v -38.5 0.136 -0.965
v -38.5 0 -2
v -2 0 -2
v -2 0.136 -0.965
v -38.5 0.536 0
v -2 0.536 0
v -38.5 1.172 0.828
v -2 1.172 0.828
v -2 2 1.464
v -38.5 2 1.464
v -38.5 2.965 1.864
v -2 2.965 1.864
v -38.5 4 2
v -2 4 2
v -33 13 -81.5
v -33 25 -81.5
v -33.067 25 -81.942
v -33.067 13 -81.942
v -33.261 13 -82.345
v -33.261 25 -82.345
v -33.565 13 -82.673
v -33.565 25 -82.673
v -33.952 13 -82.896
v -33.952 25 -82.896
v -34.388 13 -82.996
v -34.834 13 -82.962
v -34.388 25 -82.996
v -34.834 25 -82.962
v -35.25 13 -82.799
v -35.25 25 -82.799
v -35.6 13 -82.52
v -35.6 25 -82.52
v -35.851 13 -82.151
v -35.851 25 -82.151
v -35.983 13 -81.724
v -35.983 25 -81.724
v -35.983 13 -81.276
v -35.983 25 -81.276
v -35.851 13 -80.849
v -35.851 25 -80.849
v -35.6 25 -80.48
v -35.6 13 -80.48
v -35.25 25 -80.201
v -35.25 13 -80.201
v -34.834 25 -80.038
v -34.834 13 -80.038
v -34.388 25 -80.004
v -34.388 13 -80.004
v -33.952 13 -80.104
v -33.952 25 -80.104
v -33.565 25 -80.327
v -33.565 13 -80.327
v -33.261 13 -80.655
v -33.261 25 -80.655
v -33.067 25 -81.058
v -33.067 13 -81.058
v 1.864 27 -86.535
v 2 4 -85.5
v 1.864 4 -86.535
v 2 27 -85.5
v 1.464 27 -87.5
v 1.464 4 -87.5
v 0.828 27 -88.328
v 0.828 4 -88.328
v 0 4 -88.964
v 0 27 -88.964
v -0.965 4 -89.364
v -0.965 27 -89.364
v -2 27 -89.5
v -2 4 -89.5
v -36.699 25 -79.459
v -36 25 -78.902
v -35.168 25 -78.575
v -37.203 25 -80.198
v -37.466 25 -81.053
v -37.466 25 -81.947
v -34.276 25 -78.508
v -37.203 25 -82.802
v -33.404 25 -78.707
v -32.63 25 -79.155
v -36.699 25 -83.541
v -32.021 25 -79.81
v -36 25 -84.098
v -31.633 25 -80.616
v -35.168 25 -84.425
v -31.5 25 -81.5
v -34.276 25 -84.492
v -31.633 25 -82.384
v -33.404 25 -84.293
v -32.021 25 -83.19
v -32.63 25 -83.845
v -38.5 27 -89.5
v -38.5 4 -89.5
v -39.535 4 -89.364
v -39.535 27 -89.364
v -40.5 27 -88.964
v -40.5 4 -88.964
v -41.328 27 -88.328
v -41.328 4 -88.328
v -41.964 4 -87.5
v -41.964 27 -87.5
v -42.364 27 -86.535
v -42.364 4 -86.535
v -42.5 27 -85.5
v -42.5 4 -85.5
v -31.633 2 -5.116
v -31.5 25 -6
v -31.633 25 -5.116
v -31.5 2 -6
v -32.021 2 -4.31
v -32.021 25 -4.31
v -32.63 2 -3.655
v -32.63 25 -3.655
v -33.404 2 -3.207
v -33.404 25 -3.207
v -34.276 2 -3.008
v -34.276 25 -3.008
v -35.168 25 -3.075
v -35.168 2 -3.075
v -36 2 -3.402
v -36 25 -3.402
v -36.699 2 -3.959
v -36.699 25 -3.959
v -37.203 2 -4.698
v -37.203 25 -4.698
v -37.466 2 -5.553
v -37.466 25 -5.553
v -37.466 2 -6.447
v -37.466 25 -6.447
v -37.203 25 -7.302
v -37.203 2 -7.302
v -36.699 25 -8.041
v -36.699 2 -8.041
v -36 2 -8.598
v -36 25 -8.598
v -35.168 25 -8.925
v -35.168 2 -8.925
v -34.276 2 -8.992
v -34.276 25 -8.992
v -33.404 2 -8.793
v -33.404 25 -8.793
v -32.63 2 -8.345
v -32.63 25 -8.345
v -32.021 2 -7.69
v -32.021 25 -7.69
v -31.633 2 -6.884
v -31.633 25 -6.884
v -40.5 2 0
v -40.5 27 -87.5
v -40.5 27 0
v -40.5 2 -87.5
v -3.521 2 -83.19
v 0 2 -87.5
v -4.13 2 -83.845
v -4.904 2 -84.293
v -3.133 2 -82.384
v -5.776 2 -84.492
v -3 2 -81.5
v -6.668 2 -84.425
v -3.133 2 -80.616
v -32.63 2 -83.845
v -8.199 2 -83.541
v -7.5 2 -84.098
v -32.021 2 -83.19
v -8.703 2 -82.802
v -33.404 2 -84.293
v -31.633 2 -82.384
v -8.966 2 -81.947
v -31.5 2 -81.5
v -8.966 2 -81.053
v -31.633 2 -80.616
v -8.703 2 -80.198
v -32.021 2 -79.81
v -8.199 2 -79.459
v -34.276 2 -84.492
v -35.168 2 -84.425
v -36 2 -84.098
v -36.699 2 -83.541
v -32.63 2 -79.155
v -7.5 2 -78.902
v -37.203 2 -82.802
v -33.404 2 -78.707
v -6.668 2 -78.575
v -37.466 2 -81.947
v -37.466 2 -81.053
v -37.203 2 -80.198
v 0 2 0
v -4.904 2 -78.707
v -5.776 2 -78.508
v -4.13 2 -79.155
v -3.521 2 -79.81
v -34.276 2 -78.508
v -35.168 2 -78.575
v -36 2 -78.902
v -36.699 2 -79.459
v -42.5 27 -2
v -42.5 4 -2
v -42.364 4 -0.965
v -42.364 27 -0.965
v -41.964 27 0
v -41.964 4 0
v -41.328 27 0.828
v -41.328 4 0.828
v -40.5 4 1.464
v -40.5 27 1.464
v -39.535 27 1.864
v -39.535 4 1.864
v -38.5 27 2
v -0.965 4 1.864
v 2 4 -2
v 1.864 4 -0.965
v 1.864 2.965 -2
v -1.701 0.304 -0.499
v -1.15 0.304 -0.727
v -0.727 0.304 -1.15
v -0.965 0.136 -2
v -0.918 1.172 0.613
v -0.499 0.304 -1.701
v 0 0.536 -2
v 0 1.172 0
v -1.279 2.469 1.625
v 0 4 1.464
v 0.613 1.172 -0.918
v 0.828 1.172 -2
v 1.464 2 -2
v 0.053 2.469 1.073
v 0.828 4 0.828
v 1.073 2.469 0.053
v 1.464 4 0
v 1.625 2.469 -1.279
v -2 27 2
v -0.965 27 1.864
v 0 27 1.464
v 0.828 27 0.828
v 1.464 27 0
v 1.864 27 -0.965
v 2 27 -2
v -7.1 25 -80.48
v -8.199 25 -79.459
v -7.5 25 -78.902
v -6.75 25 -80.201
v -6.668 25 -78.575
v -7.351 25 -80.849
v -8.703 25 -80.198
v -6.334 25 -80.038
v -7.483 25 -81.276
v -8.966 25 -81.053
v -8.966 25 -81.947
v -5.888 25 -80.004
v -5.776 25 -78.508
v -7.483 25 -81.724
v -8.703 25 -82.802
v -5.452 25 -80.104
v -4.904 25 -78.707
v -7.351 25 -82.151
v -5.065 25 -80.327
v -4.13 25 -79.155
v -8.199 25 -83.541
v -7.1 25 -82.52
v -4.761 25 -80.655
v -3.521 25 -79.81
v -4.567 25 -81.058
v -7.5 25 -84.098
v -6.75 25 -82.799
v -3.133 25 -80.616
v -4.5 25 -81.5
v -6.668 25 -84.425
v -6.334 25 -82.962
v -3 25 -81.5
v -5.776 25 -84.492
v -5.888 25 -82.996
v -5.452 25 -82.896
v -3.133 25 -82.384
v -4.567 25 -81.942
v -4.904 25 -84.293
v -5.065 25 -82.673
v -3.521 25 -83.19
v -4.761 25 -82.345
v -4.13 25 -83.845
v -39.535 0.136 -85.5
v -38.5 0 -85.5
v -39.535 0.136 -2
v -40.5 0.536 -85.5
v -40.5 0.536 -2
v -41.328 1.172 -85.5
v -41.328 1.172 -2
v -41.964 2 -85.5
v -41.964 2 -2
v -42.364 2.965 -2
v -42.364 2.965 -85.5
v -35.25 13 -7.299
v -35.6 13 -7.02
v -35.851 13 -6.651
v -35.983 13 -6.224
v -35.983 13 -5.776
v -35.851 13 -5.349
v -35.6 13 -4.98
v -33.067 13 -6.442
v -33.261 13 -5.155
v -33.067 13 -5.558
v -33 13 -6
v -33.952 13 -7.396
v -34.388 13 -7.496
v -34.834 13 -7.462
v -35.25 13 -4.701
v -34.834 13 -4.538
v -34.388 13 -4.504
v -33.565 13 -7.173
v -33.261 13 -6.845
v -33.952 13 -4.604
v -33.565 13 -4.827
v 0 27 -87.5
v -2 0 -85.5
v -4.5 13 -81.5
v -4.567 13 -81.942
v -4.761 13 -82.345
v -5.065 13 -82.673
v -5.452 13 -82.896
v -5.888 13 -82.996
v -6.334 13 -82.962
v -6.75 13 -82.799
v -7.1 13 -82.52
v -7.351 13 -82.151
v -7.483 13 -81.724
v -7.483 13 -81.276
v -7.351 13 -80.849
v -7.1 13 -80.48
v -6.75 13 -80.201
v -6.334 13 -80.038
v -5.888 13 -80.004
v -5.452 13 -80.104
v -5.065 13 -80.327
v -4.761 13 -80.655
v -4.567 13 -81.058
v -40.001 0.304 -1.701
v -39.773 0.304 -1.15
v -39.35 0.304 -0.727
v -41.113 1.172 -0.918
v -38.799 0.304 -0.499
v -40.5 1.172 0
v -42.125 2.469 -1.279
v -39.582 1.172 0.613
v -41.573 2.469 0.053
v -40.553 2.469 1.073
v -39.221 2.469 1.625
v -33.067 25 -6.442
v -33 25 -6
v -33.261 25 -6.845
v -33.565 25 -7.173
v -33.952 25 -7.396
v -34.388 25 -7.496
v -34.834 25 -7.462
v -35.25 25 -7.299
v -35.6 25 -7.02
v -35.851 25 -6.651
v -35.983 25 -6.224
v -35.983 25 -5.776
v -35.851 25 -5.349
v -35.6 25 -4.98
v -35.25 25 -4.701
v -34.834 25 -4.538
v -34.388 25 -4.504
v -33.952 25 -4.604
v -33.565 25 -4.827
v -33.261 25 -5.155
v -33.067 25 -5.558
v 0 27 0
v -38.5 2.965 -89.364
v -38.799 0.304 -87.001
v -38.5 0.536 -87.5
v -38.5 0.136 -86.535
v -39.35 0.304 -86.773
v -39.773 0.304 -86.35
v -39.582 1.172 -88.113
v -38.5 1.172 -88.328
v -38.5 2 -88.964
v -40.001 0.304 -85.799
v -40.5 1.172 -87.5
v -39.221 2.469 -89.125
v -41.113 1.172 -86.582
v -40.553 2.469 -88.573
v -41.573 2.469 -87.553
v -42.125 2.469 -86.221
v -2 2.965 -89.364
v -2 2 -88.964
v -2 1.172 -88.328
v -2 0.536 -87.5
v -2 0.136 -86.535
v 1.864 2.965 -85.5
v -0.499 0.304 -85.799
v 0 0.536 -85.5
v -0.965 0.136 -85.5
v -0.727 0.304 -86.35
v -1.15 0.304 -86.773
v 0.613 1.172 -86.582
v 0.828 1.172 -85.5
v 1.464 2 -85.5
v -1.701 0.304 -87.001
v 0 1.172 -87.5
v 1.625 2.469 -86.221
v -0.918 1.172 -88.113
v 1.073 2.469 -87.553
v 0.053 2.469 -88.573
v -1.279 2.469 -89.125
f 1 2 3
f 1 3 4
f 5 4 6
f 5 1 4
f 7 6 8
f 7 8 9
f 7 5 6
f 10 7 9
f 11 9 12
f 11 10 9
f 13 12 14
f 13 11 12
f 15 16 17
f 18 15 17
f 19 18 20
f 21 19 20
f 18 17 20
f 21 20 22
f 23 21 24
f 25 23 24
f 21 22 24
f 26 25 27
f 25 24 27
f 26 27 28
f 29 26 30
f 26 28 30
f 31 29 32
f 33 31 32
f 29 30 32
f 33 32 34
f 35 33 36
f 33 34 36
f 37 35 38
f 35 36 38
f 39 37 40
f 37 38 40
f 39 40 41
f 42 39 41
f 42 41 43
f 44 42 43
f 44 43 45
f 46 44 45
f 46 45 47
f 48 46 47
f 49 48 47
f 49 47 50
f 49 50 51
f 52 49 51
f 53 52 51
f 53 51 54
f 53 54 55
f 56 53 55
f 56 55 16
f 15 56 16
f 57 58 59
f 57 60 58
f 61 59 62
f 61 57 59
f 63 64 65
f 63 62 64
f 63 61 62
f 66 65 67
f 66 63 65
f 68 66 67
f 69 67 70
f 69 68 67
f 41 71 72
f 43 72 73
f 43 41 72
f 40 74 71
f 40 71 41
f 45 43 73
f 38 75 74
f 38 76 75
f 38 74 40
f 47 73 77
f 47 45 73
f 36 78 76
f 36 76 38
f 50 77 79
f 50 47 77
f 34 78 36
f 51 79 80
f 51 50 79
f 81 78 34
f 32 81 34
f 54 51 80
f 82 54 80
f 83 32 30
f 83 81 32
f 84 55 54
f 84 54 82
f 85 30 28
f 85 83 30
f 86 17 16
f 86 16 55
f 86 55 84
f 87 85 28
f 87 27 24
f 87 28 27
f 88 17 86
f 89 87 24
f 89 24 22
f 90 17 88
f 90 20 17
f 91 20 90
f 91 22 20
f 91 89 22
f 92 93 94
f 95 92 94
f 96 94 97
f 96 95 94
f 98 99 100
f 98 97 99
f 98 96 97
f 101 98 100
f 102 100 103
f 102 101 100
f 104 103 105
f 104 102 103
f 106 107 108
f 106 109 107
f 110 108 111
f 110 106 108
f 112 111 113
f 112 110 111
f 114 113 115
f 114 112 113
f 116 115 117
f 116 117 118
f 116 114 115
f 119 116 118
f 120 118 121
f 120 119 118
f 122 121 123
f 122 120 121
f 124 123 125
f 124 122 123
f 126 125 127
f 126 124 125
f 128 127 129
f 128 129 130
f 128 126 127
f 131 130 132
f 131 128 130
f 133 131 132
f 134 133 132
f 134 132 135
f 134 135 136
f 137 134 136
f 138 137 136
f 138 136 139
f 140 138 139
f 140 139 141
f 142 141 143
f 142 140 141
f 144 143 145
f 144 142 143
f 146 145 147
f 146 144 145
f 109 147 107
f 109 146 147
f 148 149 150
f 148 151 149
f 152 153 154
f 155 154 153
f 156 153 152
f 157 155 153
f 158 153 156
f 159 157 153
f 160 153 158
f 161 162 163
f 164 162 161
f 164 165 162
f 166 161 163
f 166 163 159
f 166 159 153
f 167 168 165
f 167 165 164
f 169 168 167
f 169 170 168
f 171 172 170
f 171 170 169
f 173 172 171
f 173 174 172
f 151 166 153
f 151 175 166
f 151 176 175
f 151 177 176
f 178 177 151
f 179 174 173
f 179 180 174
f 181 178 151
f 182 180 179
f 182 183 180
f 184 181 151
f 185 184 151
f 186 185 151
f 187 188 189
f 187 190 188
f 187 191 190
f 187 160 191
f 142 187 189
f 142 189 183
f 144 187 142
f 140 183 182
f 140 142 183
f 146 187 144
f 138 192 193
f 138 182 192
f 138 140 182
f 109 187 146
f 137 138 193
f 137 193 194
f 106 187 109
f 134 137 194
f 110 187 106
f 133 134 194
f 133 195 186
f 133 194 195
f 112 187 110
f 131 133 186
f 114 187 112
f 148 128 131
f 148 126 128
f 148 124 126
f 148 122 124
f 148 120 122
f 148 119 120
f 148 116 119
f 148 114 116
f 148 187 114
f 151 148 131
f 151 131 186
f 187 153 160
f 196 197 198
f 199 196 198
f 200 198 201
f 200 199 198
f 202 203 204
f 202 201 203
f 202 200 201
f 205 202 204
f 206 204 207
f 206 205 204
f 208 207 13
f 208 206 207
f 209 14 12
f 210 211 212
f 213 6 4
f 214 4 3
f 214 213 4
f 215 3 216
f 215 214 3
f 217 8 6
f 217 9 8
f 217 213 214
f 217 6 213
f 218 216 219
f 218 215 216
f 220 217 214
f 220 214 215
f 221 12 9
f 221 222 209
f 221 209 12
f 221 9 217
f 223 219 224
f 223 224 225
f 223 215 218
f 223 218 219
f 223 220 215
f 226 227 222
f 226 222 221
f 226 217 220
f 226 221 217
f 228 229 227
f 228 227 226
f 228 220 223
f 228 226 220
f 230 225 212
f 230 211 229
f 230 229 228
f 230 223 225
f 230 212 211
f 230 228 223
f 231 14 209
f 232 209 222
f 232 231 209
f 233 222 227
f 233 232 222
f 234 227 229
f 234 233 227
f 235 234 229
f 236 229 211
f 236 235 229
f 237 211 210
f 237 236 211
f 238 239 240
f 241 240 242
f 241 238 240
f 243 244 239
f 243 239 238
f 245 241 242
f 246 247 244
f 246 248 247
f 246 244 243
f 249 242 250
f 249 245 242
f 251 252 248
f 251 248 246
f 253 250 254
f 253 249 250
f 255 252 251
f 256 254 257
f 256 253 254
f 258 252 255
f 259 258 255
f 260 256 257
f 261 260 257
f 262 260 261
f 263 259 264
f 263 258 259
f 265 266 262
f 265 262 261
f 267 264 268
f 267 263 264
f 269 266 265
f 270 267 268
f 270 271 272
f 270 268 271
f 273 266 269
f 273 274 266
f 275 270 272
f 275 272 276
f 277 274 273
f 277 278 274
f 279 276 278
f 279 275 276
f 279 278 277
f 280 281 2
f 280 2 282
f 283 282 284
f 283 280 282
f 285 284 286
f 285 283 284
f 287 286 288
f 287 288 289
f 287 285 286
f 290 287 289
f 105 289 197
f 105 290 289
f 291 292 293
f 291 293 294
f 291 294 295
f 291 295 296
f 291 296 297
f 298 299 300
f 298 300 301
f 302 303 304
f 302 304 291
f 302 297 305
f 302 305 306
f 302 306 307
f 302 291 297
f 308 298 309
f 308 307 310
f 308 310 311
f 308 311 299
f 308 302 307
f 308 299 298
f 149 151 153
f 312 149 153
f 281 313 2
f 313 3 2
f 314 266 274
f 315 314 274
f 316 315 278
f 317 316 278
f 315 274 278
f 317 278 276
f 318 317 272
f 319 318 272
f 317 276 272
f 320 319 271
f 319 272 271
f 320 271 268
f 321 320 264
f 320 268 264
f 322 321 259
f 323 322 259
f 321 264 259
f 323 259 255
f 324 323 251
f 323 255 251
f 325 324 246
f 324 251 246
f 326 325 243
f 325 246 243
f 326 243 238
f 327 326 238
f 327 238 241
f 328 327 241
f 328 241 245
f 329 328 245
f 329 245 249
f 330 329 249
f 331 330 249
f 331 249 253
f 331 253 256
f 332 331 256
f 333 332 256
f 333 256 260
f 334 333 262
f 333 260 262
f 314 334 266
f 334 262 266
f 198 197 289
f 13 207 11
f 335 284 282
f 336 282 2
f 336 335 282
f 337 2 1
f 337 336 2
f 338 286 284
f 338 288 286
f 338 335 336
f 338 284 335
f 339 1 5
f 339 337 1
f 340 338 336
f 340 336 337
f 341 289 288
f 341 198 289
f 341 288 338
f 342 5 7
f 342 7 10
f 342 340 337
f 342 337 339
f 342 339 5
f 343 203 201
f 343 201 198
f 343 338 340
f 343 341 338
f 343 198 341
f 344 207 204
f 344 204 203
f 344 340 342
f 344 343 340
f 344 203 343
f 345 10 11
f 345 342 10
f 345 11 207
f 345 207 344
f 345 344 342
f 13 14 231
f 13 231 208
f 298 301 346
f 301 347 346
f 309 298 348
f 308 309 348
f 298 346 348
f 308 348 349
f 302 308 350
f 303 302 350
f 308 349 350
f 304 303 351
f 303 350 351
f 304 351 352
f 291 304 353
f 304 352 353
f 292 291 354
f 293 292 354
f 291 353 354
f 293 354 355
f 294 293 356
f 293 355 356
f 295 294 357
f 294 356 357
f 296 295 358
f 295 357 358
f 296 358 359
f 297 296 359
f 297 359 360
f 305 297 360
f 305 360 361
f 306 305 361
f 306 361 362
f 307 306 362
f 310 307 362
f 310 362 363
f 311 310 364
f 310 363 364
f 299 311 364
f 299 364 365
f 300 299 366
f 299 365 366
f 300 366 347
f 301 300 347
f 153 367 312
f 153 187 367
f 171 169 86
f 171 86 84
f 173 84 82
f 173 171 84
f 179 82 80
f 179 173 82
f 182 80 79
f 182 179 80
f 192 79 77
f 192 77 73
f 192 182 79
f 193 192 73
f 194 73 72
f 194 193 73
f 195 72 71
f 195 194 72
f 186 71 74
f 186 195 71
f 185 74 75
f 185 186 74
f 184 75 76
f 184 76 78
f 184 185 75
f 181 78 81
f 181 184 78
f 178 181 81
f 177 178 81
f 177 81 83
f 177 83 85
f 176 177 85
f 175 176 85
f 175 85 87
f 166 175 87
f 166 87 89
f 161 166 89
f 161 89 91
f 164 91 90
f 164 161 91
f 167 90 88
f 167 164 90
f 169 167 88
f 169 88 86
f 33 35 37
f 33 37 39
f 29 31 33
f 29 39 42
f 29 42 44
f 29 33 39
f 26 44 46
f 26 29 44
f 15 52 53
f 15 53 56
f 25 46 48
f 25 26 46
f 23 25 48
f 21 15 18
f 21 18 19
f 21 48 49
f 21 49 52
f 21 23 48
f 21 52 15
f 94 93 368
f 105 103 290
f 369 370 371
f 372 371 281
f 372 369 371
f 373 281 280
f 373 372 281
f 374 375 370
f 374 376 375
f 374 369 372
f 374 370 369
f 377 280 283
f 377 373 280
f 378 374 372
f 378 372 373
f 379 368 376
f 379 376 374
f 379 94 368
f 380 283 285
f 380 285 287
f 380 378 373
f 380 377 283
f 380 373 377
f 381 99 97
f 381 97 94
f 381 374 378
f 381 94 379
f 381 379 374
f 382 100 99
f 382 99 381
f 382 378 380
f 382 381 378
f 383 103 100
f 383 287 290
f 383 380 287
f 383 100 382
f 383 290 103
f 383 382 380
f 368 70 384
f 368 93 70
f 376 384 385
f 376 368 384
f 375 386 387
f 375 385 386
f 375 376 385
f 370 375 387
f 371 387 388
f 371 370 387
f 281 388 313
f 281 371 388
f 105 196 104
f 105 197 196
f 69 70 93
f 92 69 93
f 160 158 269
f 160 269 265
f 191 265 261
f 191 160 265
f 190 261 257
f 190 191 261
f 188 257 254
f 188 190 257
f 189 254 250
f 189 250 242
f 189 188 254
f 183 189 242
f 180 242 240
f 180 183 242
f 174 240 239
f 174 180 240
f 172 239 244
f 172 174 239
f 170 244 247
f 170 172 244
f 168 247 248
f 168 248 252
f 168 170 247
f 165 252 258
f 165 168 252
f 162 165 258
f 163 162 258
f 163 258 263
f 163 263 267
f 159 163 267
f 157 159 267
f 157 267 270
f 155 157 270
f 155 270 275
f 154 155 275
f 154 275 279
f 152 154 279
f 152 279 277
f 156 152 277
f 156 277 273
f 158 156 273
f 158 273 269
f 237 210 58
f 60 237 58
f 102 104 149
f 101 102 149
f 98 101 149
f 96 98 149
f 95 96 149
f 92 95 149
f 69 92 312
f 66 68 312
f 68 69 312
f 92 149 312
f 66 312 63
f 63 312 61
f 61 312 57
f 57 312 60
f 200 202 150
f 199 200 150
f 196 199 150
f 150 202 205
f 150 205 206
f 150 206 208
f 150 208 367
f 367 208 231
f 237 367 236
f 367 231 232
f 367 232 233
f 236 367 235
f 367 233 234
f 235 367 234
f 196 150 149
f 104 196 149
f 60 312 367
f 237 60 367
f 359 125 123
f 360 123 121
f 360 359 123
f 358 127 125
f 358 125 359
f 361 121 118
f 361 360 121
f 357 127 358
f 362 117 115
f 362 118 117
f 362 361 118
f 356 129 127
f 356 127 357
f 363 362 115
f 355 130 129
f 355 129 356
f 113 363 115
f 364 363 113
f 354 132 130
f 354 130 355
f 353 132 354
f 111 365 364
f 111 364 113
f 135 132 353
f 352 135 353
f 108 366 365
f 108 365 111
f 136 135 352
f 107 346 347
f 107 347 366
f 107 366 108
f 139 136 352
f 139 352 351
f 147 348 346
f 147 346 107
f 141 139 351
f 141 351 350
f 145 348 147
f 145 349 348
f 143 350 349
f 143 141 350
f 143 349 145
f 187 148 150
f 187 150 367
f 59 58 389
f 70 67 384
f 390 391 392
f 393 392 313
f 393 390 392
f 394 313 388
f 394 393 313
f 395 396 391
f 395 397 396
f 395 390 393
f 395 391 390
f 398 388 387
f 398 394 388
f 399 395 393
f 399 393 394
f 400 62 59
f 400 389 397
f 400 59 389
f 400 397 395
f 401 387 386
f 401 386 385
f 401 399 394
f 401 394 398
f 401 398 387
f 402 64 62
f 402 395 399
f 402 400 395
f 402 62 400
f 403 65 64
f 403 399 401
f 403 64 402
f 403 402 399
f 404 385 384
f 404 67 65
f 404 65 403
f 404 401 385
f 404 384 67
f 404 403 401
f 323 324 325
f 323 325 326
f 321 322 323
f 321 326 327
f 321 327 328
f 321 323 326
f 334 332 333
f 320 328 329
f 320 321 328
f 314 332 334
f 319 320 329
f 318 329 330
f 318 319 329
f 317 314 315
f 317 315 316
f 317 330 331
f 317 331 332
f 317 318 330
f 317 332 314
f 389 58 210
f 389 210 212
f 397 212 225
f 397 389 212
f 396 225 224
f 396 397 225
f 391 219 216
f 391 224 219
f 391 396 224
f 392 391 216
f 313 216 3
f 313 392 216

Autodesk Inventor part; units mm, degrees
ref_plane "YZ Plane" through (0, 0, 0) normal (1, 0, 0) x (0, 1, 0)
ref_plane "XZ Plane" through (0, 0, 0) normal (0, 1, 0) x (-1, 0, 0)
ref_plane "XY Plane" through (0, 0, 0) normal (0, 0, 1) x (1, 0, 0)
sketch "Sketch1" plane through (0, 0, 0) normal (0, 1, 0) x (-1, 0, 0)
  line L0 (0, 0) -> (40.5, 0)
  line L1 (40.5, 0) -> (40.5, -87.5)
  line L2 (40.5, -87.5) -> (0, -87.5)
  line L3 (0, -87.5) -> (0, 0)
  dimension "d0" = 40.5
  dimension "d1" = 87.5
extrude "Extrusion1" add sketch "Sketch1" along normal blind 2
sketch "Sketch3" plane through (0, 2, 0) normal (0, 1, 0) x (1, 0, 0)
  line L0 (-40.5, 0) -> (0, 0) projected
  line L1 (-40.5, 0) -> (-34.5, 0)
  line L2 (-34.5, 0) -> (-34.5, 6)
  line L3 (-34.5, 6) -> (-40.5, 6)
  line L4 (-40.5, 6) -> (-40.5, 0)
  circle A0 centre (-34.5, 6) radius 3
  line L5 (-40.5, 87.5) -> (-40.5, 0) projected
  line L6 (-40.5, 87.5) -> (-34.5, 87.5)
  line L7 (-34.5, 87.5) -> (-34.5, 81.5)
  line L8 (-34.5, 81.5) -> (-40.5, 81.5)
  line L9 (-40.5, 81.5) -> (-40.5, 87.5)
  circle A1 centre (-34.5, 81.5) radius 3
  line L10 (0, 0) -> (0, 87.5) projected
  line L11 (0, 87.5) -> (-6, 87.5)
  line L12 (-6, 87.5) -> (-6, 81.5)
  line L13 (-6, 81.5) -> (0, 81.5)
  line L14 (0, 81.5) -> (0, 87.5)
  circle A2 centre (-6, 81.5) radius 3
  dimension "d4" = 6
  dimension "d5" = 6
  dimension "d6" = 6
  dimension "d7" = 6
  dimension "d8" = 6
  dimension "d9" = 6
  dimension "d10" = 6
  dimension "d11" = 6
  dimension "d12" = 6
extrude "Extrusion2" add sketch "Sketch3" along normal blind 23 contours A0 L3 L2 | L2 L3 A0 | A1 L7 L8 | L8 L7 A1 | A2 L12 L13 | L13 L12 A2
sketch "Sketch4" plane through (-34.5, 25, -6) normal (0, 1, 0) x (1, 0, 0)
  circle A0 centre (0, 0) radius 1.5
  point P0 (34.5, -6)
  dimension "d15" = 3
sketch "Sketch5" plane through (-34.5, 25, -81.5) normal (0, 1, 0) x (1, 0, 0)
  circle A0 centre (0, 0) radius 1.5
  point P0 (34.5, -81.5)
  dimension "d16" = 3
sketch "Sketch6" plane through (-6, 25, -81.5) normal (0, 1, 0) x (1, 0, 0)
  circle A0 centre (0, 0) radius 1.5
  point P0 (6, -81.5)
  dimension "d17" = 3
extrude "Extrusion3" cut sketch "Sketch4" against normal blind 12
extrude "Extrusion4" cut sketch "Sketch5" against normal blind 12
extrude "Extrusion5" cut sketch "Sketch6" against normal blind 12
sketch "Sketch7" plane through (0, 0, 0) normal (0, -1, 0) x (1, 0, 0)
  line L0 (0, 0) -> (0, -87.5) projected
  line L1 (0, 0) -> (2, 0)
  line L2 (2, 0) -> (2, -87.5)
  line L3 (2, -87.5) -> (0, -87.5)
  line L4 (0, -87.5) -> (0, 0)
  line L5 (-40.5, 0) -> (0, 0) projected
  line L6 (-40.5, 0) -> (-42.5, 0)
  line L7 (-42.5, 0) -> (-42.5, -87.5)
  line L8 (-42.5, -87.5) -> (-40.5, -87.5)
  line L9 (-40.5, -87.5) -> (-40.5, 0)
  line L10 (-42.5, -87.5) -> (2, -87.5)
  line L11 (2, -87.5) -> (2, -89.5)
  line L12 (2, -89.5) -> (-42.5, -89.5)
  line L13 (-42.5, -89.5) -> (-42.5, -87.5)
  line L14 (-42.5, 0) -> (2, 0)
  line L15 (2, 0) -> (2, 2)
  line L16 (2, 2) -> (-42.5, 2)
  line L17 (-42.5, 2) -> (-42.5, 0)
  dimension "d24" = 2
  dimension "d25" = 2
  dimension "d26" = 2
  dimension "d27" = 2
extrude "Extrusion6" add sketch "Sketch7" against normal blind 27 contours L1 L2 L3 L0 | L5 L6 L17 L16 L15 L1 | L3 L11 L12 L13 L8 L10 | L9 L8 L7 L6
fillet "Fillet1" radius 4 8 edges at (2, 13.5, 2) (2, 13.5, -89.5) (-42.5, 13.5, -89.5) (-42.5, 13.5, 2) (-20.25, 0, 2) (-42.5, 0, -43.75) (-20.25, 0, -89.5) (2, 0, -43.75)
properties part number "BottomcaseV2"
